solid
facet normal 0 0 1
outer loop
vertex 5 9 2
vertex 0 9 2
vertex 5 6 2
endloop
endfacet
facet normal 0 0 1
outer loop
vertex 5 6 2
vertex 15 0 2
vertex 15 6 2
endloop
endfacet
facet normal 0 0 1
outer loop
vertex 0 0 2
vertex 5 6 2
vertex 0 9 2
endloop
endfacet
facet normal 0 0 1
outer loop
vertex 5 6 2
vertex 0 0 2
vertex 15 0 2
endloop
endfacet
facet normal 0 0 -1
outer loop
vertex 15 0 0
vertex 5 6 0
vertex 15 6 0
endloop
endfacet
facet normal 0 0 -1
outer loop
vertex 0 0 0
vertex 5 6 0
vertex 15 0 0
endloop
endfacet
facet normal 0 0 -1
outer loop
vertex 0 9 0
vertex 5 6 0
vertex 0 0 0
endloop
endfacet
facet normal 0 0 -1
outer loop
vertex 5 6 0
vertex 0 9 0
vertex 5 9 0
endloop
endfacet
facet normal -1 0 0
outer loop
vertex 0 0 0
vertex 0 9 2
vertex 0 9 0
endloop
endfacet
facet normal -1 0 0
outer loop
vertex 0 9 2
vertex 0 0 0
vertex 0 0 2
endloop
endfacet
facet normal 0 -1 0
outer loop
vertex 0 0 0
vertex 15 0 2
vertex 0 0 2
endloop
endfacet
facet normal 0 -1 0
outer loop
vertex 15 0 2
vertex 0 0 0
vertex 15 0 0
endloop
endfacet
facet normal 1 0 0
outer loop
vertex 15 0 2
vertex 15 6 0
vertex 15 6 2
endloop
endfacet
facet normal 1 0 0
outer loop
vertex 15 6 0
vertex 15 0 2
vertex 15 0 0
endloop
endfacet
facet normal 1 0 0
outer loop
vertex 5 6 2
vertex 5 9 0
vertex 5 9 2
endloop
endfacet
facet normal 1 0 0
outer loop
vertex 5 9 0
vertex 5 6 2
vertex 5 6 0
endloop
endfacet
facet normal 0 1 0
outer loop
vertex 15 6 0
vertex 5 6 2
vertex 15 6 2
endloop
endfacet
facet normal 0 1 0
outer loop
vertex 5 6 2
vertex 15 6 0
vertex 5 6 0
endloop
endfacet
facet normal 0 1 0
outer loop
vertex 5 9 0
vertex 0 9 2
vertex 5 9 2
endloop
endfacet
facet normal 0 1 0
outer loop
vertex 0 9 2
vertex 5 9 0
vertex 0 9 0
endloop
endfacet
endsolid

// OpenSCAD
translate([2.5, 1.5, 1.0]) color([0.4505631066311552, 0.660245378622389, 0.9962578393535727]) cube([5, 3, 2], center=true);
translate([7.5, 1.5, 1.0]) color([0.9169412179474561, 0.7933250841302242, 0.0823729881966474]) cube([5, 3, 2], center=true);
translate([12.5, 1.5, 1.0]) color([0.6127831050407122, 0.4864442019691668, 0.6301473404114728]) cube([5, 3, 2], center=true);
translate([2.5, 4.5, 1.0]) color([0.8450775756715152, 0.24303562206185625, 0.7314892207908478]) cube([5, 3, 2], center=true);
translate([7.5, 4.5, 1.0]) color([0.11713429320851798, 0.22046053686782852, 0.7945829717105759]) cube([5, 3, 2], center=true);
translate([12.5, 4.5, 1.0]) color([0.33253614921965546, 0.8159130965336595, 0.1006075202160962]) cube([5, 3, 2], center=true);
translate([2.5, 7.5, 1.0]) color([0.14635848891230385, 0.6976706401912388, 0.04523406786561235]) cube([5, 3, 2], center=true);
